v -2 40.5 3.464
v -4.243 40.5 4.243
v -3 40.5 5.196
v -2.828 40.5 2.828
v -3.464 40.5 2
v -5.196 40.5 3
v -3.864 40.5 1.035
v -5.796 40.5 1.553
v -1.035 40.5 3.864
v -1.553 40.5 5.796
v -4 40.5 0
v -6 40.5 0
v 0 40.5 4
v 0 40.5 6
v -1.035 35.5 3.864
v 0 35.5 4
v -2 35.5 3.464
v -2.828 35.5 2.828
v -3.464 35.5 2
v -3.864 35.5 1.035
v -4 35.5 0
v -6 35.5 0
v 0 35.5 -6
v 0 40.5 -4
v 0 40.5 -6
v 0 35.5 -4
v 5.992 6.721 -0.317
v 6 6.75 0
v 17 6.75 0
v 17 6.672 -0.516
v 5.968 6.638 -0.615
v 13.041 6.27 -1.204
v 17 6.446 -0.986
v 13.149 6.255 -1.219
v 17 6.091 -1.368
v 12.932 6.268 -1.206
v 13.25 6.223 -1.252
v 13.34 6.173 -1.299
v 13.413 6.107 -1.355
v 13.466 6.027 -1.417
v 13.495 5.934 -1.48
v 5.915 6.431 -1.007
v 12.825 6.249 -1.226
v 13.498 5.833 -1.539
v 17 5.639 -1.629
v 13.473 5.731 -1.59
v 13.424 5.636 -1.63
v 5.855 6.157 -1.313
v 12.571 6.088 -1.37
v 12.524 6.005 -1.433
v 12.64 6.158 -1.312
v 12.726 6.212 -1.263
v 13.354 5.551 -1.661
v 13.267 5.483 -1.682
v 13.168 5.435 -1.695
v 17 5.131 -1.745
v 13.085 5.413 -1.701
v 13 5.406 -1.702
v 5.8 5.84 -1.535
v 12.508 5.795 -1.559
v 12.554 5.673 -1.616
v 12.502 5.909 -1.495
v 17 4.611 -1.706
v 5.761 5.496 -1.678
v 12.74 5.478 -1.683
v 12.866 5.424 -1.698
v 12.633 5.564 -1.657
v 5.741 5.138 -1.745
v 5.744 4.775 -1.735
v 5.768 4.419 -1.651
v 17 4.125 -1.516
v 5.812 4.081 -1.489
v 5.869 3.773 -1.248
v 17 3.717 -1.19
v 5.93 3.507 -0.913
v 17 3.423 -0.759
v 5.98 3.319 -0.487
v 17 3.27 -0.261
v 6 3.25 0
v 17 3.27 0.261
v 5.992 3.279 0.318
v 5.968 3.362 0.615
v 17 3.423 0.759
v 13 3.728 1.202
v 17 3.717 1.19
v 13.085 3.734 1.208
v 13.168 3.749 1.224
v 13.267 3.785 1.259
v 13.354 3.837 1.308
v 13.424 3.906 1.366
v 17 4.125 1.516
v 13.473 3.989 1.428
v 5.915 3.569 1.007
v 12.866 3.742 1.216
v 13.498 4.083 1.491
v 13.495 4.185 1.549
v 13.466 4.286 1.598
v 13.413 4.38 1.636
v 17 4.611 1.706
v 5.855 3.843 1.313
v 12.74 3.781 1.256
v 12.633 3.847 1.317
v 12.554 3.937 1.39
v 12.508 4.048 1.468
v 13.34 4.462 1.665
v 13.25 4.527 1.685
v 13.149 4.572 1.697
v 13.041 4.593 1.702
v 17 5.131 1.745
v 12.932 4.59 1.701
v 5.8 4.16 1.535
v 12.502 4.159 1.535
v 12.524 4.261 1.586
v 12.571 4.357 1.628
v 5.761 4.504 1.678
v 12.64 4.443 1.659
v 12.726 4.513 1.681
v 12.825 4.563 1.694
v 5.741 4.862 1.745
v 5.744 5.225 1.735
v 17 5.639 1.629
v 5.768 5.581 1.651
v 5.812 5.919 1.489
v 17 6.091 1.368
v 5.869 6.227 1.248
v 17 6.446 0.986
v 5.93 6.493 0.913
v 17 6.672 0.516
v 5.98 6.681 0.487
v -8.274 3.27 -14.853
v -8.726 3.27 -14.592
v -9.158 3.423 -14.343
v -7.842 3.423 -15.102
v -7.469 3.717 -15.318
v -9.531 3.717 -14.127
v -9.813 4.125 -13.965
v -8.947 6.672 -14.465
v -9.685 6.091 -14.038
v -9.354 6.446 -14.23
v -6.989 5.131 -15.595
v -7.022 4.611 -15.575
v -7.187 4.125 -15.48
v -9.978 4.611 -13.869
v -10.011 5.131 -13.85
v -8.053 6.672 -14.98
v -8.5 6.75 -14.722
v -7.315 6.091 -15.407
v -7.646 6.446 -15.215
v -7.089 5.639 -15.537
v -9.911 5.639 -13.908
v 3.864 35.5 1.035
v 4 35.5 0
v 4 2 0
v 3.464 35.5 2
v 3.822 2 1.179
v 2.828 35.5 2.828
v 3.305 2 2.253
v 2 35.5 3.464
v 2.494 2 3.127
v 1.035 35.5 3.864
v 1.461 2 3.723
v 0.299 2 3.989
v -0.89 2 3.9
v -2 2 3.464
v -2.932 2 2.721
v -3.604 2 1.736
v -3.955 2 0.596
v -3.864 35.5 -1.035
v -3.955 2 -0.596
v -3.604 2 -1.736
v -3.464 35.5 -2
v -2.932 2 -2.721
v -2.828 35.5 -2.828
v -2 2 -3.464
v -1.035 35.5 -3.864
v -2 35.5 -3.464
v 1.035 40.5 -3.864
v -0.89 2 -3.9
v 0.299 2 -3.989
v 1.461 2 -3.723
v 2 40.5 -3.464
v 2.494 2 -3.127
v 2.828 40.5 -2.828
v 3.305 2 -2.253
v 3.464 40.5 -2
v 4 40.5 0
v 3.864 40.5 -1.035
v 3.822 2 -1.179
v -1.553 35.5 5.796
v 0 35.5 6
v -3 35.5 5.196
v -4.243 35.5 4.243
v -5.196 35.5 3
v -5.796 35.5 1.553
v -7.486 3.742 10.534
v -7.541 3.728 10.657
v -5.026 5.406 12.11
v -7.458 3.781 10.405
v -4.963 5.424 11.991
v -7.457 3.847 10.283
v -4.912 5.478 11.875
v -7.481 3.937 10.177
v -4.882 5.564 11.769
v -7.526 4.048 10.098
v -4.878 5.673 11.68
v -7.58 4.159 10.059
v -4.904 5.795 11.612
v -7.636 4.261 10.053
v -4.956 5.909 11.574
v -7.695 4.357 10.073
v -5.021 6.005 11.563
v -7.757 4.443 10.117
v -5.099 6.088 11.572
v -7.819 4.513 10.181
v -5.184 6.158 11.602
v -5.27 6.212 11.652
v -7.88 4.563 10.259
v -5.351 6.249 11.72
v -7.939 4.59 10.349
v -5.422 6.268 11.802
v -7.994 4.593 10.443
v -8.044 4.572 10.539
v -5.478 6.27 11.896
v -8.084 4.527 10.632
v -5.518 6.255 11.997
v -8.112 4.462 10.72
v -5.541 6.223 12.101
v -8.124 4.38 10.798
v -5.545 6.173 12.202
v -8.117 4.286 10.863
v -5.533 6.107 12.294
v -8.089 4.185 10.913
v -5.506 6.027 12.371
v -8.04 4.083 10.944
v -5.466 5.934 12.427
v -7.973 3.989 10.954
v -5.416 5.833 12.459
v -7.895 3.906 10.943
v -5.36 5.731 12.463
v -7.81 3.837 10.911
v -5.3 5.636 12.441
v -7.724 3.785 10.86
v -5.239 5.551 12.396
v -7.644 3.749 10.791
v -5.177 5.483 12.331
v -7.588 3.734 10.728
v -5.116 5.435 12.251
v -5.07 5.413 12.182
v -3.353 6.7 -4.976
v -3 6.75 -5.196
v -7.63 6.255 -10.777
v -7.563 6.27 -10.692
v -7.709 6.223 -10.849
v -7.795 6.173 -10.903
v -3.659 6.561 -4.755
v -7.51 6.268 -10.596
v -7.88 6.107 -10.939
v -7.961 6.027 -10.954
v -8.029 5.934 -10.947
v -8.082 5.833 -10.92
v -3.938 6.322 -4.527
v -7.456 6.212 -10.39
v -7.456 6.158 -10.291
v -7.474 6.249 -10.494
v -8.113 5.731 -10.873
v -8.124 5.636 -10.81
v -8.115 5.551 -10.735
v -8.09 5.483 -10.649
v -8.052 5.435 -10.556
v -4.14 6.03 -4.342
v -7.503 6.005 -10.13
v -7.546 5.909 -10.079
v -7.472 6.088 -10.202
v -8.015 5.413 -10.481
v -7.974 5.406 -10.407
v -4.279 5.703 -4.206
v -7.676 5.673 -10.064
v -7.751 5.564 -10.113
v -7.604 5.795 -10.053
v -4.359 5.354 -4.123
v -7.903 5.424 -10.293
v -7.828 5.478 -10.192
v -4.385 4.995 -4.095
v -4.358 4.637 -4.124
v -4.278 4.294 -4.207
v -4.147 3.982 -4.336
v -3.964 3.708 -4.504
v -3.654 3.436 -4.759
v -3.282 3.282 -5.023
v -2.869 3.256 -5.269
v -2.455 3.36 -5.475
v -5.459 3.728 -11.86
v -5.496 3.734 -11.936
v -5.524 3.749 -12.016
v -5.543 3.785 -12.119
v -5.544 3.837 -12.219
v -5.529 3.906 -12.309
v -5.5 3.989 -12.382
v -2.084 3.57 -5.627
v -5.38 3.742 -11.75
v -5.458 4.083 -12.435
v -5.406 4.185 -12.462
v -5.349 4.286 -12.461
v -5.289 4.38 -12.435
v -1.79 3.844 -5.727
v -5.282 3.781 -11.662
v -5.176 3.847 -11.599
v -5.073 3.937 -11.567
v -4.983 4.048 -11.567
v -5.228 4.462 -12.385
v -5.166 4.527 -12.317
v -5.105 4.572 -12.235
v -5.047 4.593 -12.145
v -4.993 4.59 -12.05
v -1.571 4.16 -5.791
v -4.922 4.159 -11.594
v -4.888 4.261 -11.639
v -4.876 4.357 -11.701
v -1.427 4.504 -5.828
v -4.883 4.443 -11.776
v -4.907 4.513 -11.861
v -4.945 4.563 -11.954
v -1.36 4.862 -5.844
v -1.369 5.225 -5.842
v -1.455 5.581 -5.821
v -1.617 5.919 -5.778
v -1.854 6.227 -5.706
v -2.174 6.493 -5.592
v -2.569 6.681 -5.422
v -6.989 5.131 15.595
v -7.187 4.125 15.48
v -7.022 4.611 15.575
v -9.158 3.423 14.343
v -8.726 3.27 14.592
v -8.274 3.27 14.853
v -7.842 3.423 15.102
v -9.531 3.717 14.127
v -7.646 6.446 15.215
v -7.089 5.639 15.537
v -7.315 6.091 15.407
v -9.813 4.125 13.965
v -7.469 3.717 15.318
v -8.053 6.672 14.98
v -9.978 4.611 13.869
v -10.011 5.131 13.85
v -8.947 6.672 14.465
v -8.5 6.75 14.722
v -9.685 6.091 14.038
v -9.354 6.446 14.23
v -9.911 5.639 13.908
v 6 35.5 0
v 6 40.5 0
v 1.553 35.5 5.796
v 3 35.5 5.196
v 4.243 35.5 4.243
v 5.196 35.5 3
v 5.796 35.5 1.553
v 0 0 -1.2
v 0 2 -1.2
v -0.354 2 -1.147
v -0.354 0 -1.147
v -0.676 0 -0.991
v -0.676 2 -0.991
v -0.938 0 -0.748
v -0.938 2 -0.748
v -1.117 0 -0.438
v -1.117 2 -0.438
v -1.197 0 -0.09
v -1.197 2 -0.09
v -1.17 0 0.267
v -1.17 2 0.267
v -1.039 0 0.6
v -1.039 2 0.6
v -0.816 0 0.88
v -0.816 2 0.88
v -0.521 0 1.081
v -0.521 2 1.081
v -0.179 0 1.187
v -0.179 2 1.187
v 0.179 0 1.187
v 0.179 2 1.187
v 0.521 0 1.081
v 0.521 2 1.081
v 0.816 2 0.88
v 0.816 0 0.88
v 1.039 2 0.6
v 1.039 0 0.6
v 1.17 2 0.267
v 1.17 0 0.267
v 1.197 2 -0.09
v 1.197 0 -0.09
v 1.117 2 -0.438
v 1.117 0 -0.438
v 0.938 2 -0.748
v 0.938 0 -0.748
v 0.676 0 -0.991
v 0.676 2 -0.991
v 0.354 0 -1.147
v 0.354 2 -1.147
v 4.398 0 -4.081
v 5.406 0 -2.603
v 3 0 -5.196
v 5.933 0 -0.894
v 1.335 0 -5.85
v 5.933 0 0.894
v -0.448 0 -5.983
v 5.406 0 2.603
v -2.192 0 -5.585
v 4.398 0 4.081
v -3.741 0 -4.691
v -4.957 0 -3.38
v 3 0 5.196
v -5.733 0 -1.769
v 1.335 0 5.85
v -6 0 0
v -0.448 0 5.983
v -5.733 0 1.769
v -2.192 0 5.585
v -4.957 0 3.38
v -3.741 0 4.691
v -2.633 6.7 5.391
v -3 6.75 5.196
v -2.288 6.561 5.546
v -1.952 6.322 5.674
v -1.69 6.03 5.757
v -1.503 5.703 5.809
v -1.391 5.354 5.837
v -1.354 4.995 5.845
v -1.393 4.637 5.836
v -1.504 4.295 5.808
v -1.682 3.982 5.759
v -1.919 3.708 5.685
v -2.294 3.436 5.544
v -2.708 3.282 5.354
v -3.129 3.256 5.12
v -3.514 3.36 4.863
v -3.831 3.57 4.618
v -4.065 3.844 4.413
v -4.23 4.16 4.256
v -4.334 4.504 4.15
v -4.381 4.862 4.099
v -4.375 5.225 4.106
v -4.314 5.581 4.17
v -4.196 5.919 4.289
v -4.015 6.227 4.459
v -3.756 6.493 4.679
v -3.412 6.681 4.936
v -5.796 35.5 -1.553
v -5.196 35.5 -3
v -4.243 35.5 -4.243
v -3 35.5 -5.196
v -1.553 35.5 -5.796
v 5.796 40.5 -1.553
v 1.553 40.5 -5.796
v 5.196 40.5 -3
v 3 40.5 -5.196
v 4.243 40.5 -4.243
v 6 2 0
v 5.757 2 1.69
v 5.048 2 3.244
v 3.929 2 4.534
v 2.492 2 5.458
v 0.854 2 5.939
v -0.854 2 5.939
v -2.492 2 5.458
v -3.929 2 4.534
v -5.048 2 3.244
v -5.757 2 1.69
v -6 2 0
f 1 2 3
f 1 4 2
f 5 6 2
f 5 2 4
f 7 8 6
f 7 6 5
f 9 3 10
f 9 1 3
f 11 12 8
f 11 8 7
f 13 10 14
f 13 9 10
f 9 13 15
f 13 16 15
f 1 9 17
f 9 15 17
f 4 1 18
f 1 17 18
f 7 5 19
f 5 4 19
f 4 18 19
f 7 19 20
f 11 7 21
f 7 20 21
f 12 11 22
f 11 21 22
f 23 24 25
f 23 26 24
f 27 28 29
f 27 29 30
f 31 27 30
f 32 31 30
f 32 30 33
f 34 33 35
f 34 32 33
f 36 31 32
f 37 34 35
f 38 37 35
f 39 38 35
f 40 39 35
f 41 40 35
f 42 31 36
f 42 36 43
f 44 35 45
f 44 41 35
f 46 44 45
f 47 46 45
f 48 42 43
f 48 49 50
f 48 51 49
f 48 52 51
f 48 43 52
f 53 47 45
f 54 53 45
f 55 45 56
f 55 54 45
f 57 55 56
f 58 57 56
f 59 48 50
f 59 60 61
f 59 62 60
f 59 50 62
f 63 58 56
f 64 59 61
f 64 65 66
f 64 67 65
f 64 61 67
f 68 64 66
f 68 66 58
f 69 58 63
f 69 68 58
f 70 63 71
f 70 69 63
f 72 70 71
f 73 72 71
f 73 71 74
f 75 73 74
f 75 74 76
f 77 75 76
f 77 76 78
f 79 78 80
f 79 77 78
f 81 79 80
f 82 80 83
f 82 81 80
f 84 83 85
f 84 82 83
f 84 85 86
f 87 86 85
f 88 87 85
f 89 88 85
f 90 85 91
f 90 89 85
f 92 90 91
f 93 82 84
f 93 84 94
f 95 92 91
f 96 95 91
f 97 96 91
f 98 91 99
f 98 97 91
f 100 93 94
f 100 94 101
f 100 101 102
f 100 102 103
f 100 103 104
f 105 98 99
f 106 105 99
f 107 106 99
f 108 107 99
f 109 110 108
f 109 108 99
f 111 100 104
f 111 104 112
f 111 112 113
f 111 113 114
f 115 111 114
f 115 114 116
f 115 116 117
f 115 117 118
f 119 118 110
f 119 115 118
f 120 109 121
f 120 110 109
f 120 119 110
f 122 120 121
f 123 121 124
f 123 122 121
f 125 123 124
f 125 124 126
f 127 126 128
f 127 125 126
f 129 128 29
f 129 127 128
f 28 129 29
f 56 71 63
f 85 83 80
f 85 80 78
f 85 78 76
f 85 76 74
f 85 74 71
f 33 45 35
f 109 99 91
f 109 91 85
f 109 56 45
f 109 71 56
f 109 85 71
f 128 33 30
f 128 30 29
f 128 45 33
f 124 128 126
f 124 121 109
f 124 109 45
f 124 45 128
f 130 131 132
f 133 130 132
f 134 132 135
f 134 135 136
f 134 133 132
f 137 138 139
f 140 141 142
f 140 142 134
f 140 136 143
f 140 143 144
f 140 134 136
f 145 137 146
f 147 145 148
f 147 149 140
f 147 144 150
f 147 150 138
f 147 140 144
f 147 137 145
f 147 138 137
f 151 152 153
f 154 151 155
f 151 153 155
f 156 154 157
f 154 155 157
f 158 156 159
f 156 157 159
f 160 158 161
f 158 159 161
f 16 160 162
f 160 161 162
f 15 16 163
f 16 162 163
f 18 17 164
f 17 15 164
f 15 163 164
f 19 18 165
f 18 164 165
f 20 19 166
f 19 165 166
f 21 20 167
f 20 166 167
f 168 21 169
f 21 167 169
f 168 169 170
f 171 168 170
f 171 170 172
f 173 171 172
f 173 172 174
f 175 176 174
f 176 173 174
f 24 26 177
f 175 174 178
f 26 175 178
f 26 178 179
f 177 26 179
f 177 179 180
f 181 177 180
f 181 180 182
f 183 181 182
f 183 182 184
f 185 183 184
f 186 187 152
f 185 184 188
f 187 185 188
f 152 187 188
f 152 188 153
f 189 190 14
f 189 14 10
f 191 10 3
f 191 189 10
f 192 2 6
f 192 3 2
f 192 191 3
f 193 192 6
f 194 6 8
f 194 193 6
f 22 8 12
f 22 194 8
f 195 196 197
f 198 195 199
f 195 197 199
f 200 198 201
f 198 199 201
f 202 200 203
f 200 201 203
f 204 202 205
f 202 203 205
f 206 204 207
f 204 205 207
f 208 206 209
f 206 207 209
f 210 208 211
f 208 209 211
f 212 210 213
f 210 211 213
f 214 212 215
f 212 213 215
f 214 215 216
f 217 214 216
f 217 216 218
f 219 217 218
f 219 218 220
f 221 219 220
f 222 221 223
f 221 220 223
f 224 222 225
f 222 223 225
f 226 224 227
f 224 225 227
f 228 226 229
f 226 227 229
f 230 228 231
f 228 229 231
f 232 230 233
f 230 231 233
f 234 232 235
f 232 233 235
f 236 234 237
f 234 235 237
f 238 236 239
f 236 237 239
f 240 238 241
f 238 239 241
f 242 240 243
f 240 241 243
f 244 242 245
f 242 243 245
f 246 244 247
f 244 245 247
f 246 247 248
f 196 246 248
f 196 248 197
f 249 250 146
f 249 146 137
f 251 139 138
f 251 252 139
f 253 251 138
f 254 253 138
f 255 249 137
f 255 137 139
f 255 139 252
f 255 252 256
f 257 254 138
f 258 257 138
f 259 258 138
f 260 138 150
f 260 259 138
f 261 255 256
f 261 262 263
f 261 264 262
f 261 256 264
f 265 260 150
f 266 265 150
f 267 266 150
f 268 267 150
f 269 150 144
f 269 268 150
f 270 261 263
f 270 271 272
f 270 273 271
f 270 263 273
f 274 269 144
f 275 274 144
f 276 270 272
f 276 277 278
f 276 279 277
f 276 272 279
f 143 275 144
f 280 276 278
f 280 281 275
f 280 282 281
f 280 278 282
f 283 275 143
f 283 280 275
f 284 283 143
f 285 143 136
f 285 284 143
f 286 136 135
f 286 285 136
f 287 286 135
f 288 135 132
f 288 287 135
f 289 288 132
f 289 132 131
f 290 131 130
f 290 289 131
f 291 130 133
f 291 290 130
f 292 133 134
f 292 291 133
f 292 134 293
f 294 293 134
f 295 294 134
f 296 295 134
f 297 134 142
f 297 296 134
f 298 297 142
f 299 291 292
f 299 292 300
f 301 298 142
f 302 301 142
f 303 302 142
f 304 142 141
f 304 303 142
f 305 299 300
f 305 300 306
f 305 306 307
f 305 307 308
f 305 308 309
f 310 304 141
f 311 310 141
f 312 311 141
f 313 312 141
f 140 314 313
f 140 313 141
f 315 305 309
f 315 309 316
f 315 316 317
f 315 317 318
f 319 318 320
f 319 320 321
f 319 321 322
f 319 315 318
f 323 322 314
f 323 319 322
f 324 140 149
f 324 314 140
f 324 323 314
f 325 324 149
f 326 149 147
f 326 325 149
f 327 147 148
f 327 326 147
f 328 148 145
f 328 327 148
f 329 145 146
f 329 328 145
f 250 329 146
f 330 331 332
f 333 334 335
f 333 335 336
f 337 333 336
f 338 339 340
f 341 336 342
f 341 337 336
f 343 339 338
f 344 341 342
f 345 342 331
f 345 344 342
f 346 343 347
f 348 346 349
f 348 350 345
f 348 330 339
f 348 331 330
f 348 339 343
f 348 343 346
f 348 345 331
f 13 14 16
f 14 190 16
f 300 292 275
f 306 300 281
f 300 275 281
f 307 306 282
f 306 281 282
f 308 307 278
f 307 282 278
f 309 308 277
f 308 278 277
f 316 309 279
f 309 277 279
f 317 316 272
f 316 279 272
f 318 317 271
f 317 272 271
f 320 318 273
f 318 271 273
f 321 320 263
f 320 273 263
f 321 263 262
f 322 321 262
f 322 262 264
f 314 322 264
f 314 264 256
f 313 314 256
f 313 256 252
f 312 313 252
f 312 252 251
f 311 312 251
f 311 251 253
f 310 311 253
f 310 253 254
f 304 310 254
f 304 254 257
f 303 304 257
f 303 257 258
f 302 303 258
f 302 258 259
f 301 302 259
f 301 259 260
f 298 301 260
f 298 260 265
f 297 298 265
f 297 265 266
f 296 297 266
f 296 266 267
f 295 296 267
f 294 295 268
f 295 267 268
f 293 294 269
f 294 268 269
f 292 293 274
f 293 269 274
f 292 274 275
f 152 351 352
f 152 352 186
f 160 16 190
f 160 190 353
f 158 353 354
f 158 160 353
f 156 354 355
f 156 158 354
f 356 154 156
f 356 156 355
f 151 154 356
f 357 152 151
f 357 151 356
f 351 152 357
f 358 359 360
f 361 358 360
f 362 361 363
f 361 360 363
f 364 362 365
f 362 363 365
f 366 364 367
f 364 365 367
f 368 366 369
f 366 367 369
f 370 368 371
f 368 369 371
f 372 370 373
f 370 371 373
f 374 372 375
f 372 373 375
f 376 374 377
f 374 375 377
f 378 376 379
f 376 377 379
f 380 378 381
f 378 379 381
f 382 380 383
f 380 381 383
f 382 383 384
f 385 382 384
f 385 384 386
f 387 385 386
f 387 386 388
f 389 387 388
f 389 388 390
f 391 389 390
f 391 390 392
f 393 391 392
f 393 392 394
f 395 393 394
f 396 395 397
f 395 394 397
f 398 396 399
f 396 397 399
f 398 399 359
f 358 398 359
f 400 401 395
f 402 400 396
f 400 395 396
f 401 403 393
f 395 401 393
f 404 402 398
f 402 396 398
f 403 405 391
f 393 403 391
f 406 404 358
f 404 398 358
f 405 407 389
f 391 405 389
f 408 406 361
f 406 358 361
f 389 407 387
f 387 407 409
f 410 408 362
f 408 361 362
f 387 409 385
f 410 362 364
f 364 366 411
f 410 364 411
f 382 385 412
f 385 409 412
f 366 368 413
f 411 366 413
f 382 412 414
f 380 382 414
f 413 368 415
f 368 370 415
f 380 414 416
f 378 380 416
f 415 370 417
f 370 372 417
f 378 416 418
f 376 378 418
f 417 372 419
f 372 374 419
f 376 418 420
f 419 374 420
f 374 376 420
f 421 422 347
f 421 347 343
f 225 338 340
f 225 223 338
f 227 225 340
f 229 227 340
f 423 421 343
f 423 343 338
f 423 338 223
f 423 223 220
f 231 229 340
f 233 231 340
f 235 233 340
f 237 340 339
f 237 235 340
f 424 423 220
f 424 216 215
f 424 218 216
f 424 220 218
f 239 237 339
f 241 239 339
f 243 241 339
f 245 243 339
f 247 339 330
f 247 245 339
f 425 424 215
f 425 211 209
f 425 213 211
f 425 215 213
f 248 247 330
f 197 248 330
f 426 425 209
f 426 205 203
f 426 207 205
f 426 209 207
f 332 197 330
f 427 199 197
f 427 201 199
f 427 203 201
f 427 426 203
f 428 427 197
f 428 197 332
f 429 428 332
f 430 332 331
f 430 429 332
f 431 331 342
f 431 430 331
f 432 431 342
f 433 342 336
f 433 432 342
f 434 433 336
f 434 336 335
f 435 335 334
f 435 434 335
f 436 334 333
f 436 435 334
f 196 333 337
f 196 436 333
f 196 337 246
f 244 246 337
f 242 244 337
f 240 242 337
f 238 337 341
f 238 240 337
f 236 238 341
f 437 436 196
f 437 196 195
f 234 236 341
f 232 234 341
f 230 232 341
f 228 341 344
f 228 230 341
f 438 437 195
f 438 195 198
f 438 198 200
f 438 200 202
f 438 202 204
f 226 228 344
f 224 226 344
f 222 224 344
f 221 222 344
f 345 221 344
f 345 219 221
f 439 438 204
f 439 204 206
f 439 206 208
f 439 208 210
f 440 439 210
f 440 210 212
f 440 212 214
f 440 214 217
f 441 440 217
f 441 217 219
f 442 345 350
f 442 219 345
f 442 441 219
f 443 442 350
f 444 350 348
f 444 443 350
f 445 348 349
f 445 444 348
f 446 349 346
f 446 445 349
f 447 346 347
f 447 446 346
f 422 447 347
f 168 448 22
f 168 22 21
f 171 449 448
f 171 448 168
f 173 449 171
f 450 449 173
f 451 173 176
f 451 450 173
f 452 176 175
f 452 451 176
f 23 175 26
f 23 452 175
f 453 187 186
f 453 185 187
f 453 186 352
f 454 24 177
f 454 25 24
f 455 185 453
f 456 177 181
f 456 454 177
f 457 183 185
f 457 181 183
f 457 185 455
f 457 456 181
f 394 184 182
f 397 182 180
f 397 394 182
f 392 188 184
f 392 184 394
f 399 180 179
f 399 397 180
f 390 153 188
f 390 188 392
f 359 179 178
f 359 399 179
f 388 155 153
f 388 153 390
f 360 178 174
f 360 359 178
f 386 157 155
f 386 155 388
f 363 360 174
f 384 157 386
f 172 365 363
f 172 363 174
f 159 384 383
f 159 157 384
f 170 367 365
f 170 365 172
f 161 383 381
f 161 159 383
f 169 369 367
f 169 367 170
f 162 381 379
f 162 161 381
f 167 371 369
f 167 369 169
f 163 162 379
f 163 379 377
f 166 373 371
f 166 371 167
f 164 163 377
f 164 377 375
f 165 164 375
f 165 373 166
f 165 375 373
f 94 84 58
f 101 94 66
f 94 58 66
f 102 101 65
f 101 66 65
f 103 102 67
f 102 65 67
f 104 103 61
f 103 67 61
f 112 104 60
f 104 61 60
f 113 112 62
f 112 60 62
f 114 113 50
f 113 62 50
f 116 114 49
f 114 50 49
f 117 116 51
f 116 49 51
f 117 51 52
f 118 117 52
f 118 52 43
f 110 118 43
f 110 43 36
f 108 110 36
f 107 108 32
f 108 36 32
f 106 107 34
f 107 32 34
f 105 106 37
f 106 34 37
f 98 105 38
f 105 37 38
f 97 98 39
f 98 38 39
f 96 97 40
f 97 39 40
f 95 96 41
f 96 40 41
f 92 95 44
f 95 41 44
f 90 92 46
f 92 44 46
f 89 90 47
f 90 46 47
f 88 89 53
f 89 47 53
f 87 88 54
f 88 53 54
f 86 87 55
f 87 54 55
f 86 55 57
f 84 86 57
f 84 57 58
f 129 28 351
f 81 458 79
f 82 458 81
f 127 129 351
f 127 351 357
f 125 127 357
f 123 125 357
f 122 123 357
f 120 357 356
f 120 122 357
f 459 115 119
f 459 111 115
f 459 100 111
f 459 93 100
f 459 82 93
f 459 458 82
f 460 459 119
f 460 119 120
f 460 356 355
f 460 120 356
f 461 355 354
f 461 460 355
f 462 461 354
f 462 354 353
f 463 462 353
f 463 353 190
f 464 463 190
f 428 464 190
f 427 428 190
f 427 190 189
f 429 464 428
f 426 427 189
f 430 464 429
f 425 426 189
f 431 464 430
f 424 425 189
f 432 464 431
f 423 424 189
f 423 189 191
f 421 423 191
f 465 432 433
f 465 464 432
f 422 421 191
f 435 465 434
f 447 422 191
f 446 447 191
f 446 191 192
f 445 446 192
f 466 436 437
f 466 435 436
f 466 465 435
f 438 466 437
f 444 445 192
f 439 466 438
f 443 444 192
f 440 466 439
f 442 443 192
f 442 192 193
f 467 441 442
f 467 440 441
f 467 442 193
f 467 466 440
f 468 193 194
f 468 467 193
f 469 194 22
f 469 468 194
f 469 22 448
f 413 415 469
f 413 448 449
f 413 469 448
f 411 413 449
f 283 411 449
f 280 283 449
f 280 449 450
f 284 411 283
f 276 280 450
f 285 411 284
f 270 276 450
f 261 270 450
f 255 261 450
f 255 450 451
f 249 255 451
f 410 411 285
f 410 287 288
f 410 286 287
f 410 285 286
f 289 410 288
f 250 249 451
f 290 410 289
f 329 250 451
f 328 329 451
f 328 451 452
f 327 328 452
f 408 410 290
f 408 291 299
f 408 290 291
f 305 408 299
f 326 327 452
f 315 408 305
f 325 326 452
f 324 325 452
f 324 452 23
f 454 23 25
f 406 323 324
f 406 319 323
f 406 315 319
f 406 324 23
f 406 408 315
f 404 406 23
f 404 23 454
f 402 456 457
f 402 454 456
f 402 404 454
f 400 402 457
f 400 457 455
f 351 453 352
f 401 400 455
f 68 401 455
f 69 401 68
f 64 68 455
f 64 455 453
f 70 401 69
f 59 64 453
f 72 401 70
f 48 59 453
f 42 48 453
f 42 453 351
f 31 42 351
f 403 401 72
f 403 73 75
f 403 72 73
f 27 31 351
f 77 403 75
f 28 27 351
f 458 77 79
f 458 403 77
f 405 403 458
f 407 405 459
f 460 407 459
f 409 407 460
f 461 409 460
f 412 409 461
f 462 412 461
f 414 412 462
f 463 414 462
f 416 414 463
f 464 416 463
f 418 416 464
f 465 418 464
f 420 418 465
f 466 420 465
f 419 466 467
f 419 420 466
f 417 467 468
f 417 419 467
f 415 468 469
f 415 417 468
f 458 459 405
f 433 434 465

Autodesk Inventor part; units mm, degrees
sketch "Sketch1" plane through (0, 0, 0) normal (0, 1, 0) x (-1, 0, 0)
  circle A0 centre (0, 0) radius 6
  dimension "d0" = 12
extrude "Extrusion1" add sketch "Sketch1" along normal blind 2
sketch "Sketch2" plane through (0, 2, 0) normal (0, 1, 0) x (1, 0, 0)
  circle A0 centre (0, 0) radius 4
  circle A1 centre (0, 0) radius 6
  dimension "d3" = 8
extrude "Extrusion2" add sketch "Sketch2" along normal blind 33.5
sketch "Sketch3" plane through (0, 35.5, 0) normal (0, 1, 0) x (1, 0, 0)
  arc A0 (-6, 0) -> (0, -6) centre (0, 0) ccw
  circle A1 centre (0, 0) radius 6 construction
  arc A2 (6, 0) -> (0, 6) centre (0, 0) ccw
  line L0 (0, -6) -> (0, -4)
  circle A3 centre (0, 0) radius 4 construction
  line L1 (0, 4) -> (0, 6)
  line L2 (6, 0) -> (4, 0)
  line L3 (-4, 0) -> (-6, 0)
  arc A4 (-4, 0) -> (0, -4) centre (0, 0) ccw
  arc A5 (4, 0) -> (0, 4) centre (0, 0) ccw
extrude "Extrusion3" add sketch "Sketch3" along normal blind 5
ref_plane "Work Plane1" through (5, 0, 0) normal (1, 0, 0) x (0, 1, 0)
sketch "Sketch5" plane through (5, 0, 0) normal (1, 0, 0) x (0, 1, 0)
  line L0 (35.5, 0) -> (35.5, 6) construction
  line L1 (35.5, -6) -> (35.5, 0) construction
  circle A0 centre (5, 0) radius 1.75
  line L2 (0, 6) -> (0, -6) projected
  line L3 (44.4345, 0) -> (-10, 0) construction
  point P0 (0, 0)
  point P1 (0, 0)
  dimension "d10" = 3.5
  dimension "d44" = 5
extrude "Extrusion4" add sketch "Sketch5" along normal blind 12
pattern_circular "Circular Pattern1" count 3 over 360 about axis through (0, 0, 0) along (0, 1, 0) of "Extrusion4"
thread "Thread1" size "M3.5x0.6" class "6g" standard "ANSI Metric M Profile" length 10
thread "Thread2" size "M3.5x0.6" class "6g" standard "ANSI Metric M Profile" length 10
thread "Thread3" size "M3.5x0.6" class "6g" standard "ANSI Metric M Profile" length 10
ref_plane "Work Plane3" through (13, 5, 0) normal (1, 0, 0) x (0, 0, -1)
sketch "Sketch7" plane through (13, 5, 0) normal (1, 0, 0) x (0, 0, -1)
  circle A0 centre (0, 0) radius 1.75 construction
  arc A1 (0, 6.6281) -> (-5.7401, -3.3141) centre (0, 0) ccw construction
  line L0 (0, 0) -> (-5.7401, -3.3141) construction
  line L1 (0, 0) -> (0, 6.6281) construction
  point P0 (0, -12)
  dimension "d23" = 120
sketch "Sketch8" plane through (0, 0, 0) normal (0, -1, 0) x (1, 0, 0)
  point P0 (0, 0)
  point P1 (0, 0)
hole "Hole1" at (0, 0, 0) direction (0, 1, 0) diameter 2.4 end through all
ref_plane "Work Plane5" through (13, 4, 1.7321) normal (0, -0.5, 0.8660254) x (1, 0, 0)
ref_plane "Work Plane4" through (13, 5, 0) normal (0, -0.5, 0.8660254) x (1, 0, 0)
sketch "Sketch10" plane through (13, 4, 1.7321) normal (0, -0.5, 0.8660254) x (1, 0, 0)
  line L0 (-7, -4.3301) -> (-7, 30.7439) construction
  line L1 (-7, 1.7737) -> (-7, -1.9186) construction
  point P0 (-13, -4.3301)
  point P1 (0, 0)
  dimension "d33" = 7
hole "Hole2" at (13, 4, 1.7321) direction (0, 0.5, -0.8660254) diameter 1 end through all
pattern_circular "Circular Pattern2" count 3 over 360 about axis through (0, 0, 0) along (0, 1, 0) of "Hole2"
properties part number "UntererRührerHalter"
